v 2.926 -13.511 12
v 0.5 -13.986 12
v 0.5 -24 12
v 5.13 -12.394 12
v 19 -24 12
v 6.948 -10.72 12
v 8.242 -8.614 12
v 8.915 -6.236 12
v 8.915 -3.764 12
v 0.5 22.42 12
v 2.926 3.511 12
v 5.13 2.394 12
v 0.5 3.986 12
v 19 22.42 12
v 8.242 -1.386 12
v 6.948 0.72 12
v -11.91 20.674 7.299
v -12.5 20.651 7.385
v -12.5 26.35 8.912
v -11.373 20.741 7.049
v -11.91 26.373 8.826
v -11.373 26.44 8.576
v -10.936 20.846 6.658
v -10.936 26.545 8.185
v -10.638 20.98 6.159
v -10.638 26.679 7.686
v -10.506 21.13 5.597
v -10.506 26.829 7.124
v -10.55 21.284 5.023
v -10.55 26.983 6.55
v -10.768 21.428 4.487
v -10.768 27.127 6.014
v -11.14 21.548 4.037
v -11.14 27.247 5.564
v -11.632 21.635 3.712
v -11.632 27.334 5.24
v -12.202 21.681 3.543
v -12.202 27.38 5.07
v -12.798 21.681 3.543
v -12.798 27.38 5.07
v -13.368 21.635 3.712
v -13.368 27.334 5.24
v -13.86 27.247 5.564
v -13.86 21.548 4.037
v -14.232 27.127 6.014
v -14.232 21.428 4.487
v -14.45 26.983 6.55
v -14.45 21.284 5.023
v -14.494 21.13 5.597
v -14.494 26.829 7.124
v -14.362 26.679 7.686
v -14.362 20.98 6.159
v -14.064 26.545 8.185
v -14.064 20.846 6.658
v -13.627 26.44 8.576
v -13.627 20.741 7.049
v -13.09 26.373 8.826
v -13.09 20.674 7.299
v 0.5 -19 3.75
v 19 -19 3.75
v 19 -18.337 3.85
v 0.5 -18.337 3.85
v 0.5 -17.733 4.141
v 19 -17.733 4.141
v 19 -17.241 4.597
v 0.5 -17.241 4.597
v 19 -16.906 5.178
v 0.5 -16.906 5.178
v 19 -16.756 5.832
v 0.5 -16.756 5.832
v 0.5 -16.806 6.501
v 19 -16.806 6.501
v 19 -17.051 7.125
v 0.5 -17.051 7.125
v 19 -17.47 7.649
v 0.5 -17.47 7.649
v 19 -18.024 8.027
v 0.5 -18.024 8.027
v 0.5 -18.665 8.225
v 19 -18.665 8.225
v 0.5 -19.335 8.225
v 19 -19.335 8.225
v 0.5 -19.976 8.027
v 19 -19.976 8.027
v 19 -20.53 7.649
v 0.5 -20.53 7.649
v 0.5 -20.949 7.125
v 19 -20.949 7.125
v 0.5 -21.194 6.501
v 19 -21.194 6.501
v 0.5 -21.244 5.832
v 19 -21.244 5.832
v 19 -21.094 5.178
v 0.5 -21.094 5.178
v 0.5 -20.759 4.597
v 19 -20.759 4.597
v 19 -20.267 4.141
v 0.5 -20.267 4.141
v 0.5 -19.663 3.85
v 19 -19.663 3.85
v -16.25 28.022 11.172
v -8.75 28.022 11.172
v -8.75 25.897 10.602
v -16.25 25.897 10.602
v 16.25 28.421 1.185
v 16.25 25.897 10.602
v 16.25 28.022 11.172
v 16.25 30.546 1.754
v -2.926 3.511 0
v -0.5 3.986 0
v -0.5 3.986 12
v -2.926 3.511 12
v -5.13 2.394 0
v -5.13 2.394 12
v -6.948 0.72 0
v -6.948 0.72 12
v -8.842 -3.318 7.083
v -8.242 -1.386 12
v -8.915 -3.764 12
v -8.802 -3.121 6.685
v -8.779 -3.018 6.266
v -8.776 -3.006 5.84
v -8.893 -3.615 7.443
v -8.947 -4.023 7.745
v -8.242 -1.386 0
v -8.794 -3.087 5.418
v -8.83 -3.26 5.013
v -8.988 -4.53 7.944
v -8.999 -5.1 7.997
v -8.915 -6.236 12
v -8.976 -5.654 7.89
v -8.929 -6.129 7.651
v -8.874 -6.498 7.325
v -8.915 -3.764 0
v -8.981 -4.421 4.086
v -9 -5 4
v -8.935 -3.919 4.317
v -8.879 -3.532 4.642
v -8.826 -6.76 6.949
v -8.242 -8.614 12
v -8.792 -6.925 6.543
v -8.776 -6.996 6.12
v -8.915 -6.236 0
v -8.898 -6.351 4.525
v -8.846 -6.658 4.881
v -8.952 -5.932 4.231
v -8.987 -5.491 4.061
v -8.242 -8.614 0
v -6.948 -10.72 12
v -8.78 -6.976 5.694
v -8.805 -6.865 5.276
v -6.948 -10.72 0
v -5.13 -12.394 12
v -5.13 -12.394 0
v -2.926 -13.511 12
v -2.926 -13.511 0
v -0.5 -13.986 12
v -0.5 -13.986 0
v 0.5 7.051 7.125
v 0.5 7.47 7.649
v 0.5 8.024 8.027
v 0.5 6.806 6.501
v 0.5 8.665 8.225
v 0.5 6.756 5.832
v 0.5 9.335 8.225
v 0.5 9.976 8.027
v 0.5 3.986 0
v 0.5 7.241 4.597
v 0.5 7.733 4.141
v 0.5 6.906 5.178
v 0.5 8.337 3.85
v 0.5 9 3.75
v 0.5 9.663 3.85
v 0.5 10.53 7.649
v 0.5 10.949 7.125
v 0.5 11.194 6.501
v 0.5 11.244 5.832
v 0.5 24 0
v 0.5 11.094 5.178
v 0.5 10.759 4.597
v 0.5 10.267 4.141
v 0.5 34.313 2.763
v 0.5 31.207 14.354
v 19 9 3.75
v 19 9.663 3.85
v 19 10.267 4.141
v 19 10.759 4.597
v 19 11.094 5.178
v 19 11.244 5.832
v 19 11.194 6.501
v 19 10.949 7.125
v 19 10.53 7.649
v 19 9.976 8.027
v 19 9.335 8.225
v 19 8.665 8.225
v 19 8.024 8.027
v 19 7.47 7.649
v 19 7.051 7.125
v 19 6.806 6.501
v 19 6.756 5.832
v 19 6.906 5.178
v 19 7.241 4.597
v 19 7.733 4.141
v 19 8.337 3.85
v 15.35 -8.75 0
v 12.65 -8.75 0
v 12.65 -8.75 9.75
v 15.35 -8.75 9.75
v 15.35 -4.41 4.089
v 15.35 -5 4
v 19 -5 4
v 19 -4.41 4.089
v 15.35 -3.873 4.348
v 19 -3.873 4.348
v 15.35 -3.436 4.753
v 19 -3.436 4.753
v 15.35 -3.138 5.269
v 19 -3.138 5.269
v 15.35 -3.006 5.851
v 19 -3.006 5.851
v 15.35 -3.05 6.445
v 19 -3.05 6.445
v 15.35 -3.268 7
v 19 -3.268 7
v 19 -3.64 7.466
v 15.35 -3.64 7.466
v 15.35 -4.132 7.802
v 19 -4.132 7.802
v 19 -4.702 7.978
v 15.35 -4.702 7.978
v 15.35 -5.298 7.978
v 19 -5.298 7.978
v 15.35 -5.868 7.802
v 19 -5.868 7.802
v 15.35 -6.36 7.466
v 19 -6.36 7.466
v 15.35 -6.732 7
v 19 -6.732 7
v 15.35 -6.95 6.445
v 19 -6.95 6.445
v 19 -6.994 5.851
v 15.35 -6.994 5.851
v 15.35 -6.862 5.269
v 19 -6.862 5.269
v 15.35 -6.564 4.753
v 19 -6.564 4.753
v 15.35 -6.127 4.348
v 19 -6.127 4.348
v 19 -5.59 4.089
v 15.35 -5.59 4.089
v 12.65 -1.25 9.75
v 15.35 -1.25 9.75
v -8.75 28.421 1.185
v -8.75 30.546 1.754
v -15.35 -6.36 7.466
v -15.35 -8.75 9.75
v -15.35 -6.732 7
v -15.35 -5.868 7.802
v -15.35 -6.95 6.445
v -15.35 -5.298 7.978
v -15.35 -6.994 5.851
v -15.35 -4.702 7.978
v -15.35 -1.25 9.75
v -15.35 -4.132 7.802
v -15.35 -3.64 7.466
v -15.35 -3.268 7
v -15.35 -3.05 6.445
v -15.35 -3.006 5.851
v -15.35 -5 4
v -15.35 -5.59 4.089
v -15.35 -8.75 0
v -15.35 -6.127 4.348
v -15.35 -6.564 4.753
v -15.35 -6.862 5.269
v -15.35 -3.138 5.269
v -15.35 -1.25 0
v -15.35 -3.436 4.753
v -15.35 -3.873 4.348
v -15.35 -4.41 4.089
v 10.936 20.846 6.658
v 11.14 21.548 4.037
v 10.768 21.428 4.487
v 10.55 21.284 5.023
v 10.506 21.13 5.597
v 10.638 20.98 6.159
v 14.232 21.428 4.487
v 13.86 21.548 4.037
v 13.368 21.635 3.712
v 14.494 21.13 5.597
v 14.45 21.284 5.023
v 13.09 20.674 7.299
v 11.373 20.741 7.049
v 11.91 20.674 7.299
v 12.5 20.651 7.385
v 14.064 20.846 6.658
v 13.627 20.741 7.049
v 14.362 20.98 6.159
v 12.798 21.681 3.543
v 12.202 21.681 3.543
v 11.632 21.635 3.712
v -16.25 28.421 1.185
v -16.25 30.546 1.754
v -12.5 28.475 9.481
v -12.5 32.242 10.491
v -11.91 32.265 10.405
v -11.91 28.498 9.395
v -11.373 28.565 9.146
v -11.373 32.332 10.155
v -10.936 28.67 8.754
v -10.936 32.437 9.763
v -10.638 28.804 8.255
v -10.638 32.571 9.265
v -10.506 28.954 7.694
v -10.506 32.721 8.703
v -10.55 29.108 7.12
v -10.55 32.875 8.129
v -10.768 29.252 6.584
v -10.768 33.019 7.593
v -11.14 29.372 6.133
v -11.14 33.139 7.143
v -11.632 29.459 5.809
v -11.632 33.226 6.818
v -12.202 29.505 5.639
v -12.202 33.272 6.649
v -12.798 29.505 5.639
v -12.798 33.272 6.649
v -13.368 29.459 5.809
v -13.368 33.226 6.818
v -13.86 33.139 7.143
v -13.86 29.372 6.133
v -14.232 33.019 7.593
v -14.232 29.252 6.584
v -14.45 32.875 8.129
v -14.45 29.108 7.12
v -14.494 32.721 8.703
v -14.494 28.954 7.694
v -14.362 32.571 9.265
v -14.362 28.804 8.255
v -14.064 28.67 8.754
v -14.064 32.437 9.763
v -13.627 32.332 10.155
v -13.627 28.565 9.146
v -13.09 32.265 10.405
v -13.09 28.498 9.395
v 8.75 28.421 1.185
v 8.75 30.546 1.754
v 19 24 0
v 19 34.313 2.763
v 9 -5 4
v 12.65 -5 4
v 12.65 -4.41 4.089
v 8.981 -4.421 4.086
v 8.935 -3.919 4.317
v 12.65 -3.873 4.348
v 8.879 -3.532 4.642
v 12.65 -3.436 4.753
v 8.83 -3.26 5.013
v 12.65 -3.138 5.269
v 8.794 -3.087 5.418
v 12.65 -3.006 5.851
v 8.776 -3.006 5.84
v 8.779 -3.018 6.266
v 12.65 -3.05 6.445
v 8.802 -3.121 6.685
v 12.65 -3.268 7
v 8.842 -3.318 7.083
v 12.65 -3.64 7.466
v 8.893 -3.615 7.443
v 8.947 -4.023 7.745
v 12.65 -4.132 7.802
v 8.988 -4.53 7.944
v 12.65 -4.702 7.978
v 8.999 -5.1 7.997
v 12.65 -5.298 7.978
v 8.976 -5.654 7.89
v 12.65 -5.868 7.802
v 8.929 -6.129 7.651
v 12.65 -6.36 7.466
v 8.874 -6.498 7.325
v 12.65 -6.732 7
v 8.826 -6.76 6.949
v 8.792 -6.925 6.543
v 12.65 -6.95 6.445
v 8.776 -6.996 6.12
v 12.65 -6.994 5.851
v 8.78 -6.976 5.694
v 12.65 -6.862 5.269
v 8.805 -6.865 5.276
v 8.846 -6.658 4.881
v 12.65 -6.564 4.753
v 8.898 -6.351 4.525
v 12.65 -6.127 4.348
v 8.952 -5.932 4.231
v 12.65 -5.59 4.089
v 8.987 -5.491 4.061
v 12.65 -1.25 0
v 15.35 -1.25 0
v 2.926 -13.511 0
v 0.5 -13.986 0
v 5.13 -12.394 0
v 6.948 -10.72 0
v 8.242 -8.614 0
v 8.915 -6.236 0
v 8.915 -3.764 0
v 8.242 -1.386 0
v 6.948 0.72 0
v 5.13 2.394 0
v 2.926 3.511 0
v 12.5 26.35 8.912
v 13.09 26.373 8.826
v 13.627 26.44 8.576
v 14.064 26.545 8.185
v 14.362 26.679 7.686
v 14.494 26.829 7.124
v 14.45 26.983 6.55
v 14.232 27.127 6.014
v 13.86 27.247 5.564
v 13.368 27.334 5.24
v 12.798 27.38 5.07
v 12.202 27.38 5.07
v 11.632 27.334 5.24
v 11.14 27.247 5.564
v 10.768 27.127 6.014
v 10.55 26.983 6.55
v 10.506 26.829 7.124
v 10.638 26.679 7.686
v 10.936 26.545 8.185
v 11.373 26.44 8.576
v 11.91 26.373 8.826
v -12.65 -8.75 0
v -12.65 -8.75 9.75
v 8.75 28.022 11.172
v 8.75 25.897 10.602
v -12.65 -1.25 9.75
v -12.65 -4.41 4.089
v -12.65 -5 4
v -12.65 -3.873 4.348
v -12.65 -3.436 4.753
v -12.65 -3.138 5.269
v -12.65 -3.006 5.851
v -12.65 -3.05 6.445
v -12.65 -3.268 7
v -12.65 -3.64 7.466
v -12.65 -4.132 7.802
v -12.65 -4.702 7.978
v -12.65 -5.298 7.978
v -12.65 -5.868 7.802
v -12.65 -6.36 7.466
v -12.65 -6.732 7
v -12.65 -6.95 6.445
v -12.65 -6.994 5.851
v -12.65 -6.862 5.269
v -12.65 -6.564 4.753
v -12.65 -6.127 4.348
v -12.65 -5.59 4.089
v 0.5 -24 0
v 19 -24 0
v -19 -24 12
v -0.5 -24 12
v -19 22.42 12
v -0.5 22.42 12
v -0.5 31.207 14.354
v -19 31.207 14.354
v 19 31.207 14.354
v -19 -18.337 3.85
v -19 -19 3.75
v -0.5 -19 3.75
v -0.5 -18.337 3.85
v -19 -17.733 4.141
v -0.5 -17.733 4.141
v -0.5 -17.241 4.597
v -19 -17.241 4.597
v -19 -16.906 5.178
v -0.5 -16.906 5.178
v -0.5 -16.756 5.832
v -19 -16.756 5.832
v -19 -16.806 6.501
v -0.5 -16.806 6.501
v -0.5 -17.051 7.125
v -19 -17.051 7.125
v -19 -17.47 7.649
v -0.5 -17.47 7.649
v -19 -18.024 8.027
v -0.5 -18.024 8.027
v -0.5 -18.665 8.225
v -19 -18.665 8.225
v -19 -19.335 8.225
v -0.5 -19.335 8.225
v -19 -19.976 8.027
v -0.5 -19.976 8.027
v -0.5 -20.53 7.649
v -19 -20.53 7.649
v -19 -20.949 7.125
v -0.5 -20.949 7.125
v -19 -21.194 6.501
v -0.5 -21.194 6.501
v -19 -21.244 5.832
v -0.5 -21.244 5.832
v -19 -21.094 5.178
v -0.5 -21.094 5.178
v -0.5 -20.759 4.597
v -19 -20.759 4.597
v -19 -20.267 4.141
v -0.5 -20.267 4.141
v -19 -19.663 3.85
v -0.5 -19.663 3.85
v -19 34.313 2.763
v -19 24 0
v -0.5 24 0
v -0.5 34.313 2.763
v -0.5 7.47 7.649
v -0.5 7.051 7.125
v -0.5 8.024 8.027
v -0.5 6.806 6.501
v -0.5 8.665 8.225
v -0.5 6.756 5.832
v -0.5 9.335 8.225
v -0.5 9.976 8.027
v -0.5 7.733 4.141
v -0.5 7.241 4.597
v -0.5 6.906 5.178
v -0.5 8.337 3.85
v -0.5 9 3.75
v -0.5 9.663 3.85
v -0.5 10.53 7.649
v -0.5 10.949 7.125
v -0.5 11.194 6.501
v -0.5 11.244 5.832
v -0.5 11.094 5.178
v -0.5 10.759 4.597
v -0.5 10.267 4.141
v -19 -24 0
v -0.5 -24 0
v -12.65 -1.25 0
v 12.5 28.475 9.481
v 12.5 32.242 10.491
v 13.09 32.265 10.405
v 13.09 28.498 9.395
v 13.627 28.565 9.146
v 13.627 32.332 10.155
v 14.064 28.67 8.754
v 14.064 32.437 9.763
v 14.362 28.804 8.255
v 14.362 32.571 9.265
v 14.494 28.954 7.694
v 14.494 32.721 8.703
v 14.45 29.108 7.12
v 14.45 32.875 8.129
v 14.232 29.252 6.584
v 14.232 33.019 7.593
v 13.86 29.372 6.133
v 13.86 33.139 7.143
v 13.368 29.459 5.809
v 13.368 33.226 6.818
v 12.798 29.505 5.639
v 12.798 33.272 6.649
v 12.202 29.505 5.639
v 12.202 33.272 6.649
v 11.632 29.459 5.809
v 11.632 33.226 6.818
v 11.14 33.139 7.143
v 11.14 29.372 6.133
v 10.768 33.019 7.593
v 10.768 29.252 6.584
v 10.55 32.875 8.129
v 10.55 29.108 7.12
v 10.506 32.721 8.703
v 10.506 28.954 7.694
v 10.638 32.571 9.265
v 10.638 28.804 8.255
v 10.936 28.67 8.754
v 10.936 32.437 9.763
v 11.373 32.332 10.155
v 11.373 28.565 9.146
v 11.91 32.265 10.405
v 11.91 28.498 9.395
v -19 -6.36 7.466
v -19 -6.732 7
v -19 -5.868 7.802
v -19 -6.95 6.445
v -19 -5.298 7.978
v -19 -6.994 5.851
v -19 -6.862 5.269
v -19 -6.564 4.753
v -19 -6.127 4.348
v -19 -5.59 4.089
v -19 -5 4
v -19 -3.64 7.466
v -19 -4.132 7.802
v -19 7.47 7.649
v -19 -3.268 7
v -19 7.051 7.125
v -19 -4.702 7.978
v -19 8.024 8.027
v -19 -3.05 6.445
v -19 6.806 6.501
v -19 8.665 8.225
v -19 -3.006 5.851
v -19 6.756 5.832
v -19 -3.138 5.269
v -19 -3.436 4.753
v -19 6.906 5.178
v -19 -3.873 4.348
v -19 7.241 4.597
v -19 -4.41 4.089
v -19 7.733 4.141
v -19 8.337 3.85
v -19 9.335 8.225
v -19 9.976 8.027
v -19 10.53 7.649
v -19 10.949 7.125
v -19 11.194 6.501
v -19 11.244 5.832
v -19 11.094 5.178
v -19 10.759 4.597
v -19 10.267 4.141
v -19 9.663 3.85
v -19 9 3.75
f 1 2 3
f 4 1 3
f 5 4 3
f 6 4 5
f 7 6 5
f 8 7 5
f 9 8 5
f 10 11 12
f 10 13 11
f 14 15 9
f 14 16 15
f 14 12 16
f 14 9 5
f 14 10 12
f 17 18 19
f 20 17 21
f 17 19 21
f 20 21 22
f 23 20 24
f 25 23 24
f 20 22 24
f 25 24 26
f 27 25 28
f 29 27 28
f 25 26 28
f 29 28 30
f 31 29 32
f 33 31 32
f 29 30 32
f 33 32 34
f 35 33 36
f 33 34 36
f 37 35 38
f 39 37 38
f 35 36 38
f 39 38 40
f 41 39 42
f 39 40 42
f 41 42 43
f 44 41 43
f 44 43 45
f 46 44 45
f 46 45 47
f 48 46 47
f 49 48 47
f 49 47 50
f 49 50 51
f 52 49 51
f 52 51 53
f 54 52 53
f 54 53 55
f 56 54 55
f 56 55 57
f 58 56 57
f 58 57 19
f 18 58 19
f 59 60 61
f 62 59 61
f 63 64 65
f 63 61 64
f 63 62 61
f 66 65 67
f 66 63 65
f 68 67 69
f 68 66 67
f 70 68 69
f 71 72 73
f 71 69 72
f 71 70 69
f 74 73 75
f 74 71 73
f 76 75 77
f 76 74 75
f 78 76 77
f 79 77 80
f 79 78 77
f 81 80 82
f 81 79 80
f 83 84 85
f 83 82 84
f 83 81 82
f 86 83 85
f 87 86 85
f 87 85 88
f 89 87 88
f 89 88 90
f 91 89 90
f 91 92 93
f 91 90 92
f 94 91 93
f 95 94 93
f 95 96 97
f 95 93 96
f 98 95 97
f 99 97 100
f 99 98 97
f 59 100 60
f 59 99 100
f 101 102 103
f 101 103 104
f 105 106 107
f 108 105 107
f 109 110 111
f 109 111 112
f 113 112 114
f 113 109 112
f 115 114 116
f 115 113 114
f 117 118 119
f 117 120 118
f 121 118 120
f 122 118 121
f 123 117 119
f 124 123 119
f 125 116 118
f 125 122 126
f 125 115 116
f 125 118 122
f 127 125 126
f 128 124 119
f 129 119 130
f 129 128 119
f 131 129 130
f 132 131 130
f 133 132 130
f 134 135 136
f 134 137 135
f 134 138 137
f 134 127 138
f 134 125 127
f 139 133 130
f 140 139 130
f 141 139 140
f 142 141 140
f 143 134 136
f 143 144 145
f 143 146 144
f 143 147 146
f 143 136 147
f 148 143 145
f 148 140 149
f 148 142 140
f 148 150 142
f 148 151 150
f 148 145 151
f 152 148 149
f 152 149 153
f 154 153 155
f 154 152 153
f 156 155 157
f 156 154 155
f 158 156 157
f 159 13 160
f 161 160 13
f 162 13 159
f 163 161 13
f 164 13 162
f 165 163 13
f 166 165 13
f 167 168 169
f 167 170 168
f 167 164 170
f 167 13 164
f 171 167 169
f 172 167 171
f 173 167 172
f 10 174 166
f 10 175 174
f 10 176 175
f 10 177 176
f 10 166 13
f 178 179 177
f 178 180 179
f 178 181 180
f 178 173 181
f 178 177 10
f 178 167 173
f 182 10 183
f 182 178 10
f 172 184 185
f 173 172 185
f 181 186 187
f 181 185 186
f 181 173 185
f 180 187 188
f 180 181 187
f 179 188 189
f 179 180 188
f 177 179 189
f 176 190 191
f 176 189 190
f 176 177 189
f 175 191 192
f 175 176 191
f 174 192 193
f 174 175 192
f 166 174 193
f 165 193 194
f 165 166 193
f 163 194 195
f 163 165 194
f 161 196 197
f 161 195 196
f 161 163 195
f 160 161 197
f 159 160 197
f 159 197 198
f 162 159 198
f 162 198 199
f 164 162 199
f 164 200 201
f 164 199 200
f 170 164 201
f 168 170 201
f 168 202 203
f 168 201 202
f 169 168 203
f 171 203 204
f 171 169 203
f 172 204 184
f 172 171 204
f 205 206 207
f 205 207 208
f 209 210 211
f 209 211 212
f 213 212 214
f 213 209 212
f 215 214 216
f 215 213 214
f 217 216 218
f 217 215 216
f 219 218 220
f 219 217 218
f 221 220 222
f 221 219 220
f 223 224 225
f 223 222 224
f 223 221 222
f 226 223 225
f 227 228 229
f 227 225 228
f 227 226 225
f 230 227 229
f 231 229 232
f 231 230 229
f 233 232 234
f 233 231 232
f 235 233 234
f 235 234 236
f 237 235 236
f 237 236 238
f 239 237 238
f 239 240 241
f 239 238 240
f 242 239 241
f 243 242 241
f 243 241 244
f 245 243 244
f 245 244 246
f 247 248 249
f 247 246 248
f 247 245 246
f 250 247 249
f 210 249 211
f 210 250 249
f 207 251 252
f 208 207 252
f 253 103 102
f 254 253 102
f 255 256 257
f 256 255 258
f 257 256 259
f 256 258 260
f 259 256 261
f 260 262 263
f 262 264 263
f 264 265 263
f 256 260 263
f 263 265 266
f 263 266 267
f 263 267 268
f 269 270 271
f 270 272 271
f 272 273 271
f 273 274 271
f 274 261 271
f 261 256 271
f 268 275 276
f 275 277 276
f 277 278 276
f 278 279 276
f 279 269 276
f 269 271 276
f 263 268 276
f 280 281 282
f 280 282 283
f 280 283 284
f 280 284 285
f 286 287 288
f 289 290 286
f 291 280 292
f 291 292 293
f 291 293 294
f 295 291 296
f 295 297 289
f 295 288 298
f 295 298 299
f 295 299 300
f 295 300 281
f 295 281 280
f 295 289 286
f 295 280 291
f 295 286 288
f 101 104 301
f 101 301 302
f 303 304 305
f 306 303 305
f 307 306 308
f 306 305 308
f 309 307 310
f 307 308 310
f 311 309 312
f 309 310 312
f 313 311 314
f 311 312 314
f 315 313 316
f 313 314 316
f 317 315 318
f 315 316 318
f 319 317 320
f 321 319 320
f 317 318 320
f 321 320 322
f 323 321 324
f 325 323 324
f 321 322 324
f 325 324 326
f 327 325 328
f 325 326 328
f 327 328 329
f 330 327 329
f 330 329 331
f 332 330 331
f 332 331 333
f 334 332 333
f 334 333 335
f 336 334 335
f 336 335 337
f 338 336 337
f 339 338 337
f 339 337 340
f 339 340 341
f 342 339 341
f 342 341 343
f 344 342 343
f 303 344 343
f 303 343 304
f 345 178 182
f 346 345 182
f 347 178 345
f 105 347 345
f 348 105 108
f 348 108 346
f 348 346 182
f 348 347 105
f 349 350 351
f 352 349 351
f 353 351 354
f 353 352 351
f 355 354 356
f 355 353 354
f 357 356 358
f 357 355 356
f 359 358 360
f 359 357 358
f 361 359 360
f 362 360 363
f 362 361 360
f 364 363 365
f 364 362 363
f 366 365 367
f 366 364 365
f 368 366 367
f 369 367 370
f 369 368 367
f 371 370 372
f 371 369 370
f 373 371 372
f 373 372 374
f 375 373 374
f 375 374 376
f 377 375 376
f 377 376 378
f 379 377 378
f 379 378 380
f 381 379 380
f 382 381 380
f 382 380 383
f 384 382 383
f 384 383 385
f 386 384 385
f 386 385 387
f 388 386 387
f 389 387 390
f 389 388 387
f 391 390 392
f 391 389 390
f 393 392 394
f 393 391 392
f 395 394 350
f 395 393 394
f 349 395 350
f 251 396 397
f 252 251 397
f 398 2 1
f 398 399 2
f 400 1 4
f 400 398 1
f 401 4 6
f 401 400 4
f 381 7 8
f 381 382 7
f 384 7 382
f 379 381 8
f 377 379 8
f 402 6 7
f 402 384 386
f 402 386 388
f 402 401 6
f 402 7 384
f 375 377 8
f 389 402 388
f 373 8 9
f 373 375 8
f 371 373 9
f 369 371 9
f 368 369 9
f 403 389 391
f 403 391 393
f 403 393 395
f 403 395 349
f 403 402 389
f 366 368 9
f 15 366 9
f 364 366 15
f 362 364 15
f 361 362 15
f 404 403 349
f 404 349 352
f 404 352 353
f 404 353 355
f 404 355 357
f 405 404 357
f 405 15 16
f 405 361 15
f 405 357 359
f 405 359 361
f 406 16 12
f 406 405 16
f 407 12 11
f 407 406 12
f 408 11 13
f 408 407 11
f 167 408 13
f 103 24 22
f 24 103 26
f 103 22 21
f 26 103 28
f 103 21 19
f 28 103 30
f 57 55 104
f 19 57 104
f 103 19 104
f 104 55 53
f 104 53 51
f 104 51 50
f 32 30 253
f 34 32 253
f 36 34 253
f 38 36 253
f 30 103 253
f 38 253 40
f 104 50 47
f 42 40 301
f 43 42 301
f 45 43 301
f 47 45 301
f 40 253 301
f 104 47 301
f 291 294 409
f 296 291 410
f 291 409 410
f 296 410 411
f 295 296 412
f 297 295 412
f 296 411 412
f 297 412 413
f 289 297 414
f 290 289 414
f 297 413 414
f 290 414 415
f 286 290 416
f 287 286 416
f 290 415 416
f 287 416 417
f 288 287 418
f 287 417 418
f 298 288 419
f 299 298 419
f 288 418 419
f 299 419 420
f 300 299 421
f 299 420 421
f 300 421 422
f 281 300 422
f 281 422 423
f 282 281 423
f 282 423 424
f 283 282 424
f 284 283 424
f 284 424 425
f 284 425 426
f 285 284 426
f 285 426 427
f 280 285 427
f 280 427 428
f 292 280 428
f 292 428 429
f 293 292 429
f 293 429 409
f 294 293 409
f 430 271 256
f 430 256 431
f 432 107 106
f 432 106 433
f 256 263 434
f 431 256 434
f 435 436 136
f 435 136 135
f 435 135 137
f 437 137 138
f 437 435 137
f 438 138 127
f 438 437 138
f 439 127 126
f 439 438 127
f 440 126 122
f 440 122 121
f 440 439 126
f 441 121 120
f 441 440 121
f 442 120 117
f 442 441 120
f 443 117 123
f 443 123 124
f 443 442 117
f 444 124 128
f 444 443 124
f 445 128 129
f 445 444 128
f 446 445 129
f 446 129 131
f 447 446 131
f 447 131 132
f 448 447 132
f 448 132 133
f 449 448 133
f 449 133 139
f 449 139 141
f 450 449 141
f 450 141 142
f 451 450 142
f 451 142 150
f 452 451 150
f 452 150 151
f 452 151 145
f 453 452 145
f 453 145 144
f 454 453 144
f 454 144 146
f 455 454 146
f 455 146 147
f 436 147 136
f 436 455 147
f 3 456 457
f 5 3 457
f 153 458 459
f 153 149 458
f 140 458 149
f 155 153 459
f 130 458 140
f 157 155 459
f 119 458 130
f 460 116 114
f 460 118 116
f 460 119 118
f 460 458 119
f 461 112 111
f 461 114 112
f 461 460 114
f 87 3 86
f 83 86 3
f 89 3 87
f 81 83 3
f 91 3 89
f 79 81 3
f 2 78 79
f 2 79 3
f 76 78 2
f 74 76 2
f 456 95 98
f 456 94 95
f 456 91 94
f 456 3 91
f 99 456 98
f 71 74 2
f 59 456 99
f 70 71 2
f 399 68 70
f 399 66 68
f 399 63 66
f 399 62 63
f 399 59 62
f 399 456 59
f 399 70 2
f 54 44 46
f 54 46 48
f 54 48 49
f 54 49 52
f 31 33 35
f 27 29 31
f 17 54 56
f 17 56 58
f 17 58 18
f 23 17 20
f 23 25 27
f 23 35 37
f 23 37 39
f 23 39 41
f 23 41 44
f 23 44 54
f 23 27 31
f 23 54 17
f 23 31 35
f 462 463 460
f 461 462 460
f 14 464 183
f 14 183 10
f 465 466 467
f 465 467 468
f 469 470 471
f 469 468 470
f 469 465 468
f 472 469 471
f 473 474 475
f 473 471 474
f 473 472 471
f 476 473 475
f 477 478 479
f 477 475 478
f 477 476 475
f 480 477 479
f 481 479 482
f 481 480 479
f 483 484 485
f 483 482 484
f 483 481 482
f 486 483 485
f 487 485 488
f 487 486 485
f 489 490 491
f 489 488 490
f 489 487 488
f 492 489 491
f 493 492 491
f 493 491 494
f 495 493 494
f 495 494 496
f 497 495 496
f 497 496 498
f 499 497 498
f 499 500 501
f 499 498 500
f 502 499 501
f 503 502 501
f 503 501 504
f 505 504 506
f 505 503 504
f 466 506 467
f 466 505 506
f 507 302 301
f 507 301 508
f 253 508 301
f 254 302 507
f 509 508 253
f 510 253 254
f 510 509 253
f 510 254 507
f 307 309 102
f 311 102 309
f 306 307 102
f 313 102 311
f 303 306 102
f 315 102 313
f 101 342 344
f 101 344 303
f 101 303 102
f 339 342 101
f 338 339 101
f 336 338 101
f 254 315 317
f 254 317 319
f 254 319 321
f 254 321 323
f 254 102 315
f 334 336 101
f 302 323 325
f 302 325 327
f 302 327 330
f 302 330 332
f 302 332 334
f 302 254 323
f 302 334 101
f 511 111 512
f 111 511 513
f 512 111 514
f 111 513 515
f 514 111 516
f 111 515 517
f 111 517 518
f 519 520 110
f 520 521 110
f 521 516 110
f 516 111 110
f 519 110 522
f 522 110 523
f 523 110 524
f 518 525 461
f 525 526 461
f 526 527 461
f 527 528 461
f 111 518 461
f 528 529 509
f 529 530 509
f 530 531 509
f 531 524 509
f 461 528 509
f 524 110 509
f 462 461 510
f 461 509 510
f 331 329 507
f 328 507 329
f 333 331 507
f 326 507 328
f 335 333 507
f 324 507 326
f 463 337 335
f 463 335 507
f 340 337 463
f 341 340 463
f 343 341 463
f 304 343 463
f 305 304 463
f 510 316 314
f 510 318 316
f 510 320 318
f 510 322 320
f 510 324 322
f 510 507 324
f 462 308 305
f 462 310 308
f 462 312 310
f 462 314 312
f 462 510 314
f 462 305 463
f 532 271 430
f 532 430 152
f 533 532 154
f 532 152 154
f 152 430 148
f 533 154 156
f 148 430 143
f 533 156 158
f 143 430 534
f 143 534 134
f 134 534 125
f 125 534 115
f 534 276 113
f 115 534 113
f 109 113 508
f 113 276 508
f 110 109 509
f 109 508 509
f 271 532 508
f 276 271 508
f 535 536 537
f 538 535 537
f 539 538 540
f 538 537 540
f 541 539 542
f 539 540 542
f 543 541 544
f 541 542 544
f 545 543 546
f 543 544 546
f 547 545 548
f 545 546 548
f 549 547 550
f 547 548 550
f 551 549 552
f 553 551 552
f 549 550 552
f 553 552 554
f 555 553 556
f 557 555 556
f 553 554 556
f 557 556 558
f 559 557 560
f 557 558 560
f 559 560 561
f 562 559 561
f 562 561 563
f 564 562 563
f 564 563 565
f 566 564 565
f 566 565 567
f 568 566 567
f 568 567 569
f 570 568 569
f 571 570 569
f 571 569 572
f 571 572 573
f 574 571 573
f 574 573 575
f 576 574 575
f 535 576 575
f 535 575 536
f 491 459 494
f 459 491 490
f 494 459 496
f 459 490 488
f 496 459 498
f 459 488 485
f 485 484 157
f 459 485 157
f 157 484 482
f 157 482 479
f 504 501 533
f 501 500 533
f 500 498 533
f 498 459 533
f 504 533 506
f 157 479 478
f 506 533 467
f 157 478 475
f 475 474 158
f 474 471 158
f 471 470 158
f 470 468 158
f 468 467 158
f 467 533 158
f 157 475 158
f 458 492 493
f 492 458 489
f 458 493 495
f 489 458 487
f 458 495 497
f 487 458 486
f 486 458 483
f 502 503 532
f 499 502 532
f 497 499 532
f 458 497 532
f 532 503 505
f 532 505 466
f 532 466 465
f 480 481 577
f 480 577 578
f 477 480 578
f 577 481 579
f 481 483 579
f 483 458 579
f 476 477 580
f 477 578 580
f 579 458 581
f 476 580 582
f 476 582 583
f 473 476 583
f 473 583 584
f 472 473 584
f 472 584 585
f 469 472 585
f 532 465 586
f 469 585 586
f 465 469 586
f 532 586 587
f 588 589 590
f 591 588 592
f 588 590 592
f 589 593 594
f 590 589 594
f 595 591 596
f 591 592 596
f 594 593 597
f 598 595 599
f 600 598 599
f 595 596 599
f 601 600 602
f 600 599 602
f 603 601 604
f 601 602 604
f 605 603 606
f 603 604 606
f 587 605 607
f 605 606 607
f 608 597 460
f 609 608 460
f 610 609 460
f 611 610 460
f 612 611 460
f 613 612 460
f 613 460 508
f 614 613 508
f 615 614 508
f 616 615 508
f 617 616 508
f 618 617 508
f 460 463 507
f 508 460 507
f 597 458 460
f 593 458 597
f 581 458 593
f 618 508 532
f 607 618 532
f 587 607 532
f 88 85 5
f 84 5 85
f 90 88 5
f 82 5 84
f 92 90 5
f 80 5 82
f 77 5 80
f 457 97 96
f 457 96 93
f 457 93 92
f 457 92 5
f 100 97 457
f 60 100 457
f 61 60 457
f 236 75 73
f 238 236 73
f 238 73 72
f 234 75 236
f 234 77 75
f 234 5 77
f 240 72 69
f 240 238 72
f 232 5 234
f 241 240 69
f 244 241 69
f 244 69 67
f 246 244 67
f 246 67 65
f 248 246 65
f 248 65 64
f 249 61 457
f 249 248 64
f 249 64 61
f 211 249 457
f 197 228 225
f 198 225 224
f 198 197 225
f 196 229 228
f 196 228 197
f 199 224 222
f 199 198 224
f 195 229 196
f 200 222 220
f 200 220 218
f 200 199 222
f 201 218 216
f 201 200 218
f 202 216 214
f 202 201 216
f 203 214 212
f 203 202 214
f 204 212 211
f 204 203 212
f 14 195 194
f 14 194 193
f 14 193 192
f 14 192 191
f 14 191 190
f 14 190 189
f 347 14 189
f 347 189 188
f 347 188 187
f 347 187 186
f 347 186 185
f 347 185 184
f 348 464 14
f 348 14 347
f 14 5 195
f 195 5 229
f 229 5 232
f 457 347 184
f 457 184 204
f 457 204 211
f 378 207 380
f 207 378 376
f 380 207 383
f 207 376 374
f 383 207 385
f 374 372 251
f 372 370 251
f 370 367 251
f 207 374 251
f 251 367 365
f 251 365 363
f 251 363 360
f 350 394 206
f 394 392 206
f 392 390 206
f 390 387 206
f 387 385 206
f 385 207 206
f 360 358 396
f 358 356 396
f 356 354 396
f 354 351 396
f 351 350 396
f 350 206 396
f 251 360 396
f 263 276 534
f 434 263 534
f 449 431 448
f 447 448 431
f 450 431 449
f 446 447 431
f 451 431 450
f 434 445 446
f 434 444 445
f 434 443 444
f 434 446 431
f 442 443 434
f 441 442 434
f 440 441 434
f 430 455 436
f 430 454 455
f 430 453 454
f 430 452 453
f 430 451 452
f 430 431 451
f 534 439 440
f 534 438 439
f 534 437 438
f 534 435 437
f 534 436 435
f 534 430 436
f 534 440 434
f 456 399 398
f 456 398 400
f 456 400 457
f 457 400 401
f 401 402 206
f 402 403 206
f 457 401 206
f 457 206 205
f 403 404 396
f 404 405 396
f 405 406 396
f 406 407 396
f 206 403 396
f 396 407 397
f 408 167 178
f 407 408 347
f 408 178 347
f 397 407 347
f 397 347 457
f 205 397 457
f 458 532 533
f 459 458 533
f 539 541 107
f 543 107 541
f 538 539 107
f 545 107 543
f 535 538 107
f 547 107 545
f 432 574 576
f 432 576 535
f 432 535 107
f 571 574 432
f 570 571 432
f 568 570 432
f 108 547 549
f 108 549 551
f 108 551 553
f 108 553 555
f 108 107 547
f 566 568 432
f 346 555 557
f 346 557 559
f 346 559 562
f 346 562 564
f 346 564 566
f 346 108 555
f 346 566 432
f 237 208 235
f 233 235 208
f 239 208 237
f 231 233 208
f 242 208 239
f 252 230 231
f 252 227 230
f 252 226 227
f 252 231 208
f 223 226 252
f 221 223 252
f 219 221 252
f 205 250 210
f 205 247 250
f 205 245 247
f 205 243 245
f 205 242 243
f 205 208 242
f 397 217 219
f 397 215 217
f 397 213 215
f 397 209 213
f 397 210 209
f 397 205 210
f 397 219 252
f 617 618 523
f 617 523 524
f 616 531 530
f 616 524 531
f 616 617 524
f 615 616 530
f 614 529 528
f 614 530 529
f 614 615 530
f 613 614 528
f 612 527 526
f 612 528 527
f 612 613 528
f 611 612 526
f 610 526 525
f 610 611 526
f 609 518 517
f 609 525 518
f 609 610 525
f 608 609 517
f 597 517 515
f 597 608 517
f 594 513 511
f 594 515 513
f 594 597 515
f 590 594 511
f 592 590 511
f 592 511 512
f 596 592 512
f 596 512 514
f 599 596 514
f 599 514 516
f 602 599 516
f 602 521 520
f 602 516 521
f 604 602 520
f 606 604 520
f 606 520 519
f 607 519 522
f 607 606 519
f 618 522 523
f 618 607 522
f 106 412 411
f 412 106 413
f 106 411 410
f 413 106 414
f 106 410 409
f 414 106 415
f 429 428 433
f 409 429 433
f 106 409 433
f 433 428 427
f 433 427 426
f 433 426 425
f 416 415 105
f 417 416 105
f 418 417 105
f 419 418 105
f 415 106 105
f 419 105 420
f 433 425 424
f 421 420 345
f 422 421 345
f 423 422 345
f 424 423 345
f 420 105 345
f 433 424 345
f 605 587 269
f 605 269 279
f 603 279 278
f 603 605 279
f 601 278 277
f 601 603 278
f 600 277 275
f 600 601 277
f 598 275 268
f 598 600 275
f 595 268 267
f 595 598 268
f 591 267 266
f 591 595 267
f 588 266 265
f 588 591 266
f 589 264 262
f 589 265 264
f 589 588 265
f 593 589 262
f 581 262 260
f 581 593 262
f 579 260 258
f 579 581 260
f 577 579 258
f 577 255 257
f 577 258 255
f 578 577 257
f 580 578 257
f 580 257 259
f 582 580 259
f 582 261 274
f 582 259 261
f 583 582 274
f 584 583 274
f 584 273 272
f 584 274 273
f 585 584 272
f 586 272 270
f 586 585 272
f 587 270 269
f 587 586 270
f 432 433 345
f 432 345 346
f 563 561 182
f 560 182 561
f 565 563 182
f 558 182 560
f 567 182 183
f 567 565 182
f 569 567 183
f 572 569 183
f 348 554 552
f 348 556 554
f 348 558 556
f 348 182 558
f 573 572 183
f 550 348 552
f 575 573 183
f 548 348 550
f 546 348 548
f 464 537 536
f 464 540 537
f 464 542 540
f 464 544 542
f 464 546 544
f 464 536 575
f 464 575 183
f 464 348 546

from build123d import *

# Parameters (mm, degrees)
SKETCH1_W               = 38
SKETCH1_H               = 48
SKETCH1_R               = 9
BOSS_EXTRUDE1_DEPTH     = 12
CUT_EXTRUDE1_DEPTH      = 33.878564446
CUT_EXTRUDE1_DEPTH_BACK = 33.878564446
SKETCH2_R               = 2.25
SKETCH2_R_2             = 2
SKETCH5_W               = 2.7
SKETCH5_H               = 7.5
CUT_EXTRUDE4_DEPTH      = 9.75
BOSS_EXTRUDE2_DEPTH     = 19
SKETCH4_W               = 1
SKETCH4_H               = 58.312792412
CUT_EXTRUDE3_DEPTH      = 42.766217609
SKETCH7_R               = 2
CUT_EXTRUDE5_DEPTH      = 12
SKETCH8_W               = 7.5
SKETCH8_H               = 2.2
CUT_EXTRUDE6_DEPTH      = 9.75


with BuildPart() as part:
    # Sketch1 → Boss-Extrude1 (new body)
    with BuildSketch(Plane.XY):
        Rectangle(SKETCH1_W, SKETCH1_H)
        with Locations((0, -5)):
            Circle(SKETCH1_R, mode=Mode.SUBTRACT)
    extrude(amount=BOSS_EXTRUDE1_DEPTH)

    # Sketch2 → Cut-Extrude1 (cut, two sides: drawn at the far end of the back side and taken through both)
    with BuildSketch(Plane(origin=(0, 0, 0), x_dir=(0, 0, -1), z_dir=(1, 0, 0)).offset(-CUT_EXTRUDE1_DEPTH_BACK)):
        with Locations((-6, -19)):
            Circle(SKETCH2_R)
        with Locations((-6, -5)):
            Circle(SKETCH2_R_2)
        with Locations((-6, 9)):
            Circle(SKETCH2_R)
    extrude(amount=CUT_EXTRUDE1_DEPTH + CUT_EXTRUDE1_DEPTH_BACK, mode=Mode.SUBTRACT)

    # Sketch5 → Cut-Extrude4 (cut)
    with BuildSketch(Plane.XY):
        with Locations((14, -5)):
            Rectangle(SKETCH5_W, SKETCH5_H)
        with Locations((-14, -5)):
            Rectangle(SKETCH5_W, SKETCH5_H)
    extrude(amount=CUT_EXTRUDE4_DEPTH, mode=Mode.SUBTRACT)

    # Sketch6 → Boss-Extrude2 (add, symmetric)
    with BuildSketch(Plane(origin=(0, 0, 0), x_dir=(0, 0, -1), z_dir=(1, 0, 0))):
        Polygon((0, 24), (-2.763304398, 34.312792412), (-14.354414314, 31.20696387), (-12, 22.420170029), (-12, 24), align=None)
    extrude(amount=BOSS_EXTRUDE2_DEPTH, both=True)

    # Sketch4 → Cut-Extrude3 (cut, through all)
    with BuildSketch(Plane.XY):
        with Locations((0, 5.156396206)):
            Rectangle(SKETCH4_W, SKETCH4_H)
    extrude(amount=CUT_EXTRUDE3_DEPTH, mode=Mode.SUBTRACT)


with BuildPart() as cut_extrude3_piece_1:
    # of the separate pieces the step leaves, piece 1, a body of its own (cut_extrude3_pieces)
    add(part.part.solids().sort_by_distance((-19, -24, 0))[0])


with BuildPart() as cut_extrude3_piece_2:
    # of the separate pieces the step leaves, piece 2, a body of its own (cut_extrude3_pieces)
    add(part.part.solids().sort_by_distance((19, -24, 0))[0])


with BuildPart() as cut_extrude5_tool:
    # Sketch7 → Cut-Extrude5 (new body)
    with BuildSketch(Plane(origin=(0, 32.705097257, 8.763304398), x_dir=(1, 0, 0), z_dir=(0, 0.9659258262890681, 0.2588190451025213))):
        with Locations(Location((-12.5, 0.211657082, 0), (0, 0, 270))):
            Circle(SKETCH7_R)
        with Locations(Location((12.5, 0.211657082, 0), (0, 0, 270))):
            Circle(SKETCH7_R)
    extrude(amount=-CUT_EXTRUDE5_DEPTH)


with BuildPart() as cut_extrude3_piece_1_1:
    add(cut_extrude3_piece_1.part)

    # Cut-Extrude5: cut by cut_extrude5_tool
    add(cut_extrude5_tool.part, mode=Mode.SUBTRACT)


with BuildPart() as cut_extrude3_piece_2_1:
    add(cut_extrude3_piece_2.part)

    # Cut-Extrude5: cut by cut_extrude5_tool
    add(cut_extrude5_tool.part, mode=Mode.SUBTRACT)


with BuildPart() as cut_extrude6_tool:
    # Sketch8 → Cut-Extrude6 (new body)
    with BuildSketch(Plane(origin=(0, 1.607695155, -6), x_dir=(-1, 0, 0), z_dir=(0, 0.2588190451025215, -0.9659258262890681))):
        with Locations((-12.5, 28.858808168)):
            Rectangle(SKETCH8_W, SKETCH8_H)
        with Locations((12.5, 28.858808168)):
            Rectangle(SKETCH8_W, SKETCH8_H)
    extrude(amount=-CUT_EXTRUDE6_DEPTH)


with BuildPart() as cut_extrude3_piece_1_2:
    add(cut_extrude3_piece_1_1.part)

    # Cut-Extrude6: cut by cut_extrude6_tool
    add(cut_extrude6_tool.part, mode=Mode.SUBTRACT)


with BuildPart() as cut_extrude3_piece_2_2:
    add(cut_extrude3_piece_2_1.part)

    # Cut-Extrude6: cut by cut_extrude6_tool
    add(cut_extrude6_tool.part, mode=Mode.SUBTRACT)


solid = Compound([cut_extrude3_piece_1_2.part, cut_extrude3_piece_2_2.part])
